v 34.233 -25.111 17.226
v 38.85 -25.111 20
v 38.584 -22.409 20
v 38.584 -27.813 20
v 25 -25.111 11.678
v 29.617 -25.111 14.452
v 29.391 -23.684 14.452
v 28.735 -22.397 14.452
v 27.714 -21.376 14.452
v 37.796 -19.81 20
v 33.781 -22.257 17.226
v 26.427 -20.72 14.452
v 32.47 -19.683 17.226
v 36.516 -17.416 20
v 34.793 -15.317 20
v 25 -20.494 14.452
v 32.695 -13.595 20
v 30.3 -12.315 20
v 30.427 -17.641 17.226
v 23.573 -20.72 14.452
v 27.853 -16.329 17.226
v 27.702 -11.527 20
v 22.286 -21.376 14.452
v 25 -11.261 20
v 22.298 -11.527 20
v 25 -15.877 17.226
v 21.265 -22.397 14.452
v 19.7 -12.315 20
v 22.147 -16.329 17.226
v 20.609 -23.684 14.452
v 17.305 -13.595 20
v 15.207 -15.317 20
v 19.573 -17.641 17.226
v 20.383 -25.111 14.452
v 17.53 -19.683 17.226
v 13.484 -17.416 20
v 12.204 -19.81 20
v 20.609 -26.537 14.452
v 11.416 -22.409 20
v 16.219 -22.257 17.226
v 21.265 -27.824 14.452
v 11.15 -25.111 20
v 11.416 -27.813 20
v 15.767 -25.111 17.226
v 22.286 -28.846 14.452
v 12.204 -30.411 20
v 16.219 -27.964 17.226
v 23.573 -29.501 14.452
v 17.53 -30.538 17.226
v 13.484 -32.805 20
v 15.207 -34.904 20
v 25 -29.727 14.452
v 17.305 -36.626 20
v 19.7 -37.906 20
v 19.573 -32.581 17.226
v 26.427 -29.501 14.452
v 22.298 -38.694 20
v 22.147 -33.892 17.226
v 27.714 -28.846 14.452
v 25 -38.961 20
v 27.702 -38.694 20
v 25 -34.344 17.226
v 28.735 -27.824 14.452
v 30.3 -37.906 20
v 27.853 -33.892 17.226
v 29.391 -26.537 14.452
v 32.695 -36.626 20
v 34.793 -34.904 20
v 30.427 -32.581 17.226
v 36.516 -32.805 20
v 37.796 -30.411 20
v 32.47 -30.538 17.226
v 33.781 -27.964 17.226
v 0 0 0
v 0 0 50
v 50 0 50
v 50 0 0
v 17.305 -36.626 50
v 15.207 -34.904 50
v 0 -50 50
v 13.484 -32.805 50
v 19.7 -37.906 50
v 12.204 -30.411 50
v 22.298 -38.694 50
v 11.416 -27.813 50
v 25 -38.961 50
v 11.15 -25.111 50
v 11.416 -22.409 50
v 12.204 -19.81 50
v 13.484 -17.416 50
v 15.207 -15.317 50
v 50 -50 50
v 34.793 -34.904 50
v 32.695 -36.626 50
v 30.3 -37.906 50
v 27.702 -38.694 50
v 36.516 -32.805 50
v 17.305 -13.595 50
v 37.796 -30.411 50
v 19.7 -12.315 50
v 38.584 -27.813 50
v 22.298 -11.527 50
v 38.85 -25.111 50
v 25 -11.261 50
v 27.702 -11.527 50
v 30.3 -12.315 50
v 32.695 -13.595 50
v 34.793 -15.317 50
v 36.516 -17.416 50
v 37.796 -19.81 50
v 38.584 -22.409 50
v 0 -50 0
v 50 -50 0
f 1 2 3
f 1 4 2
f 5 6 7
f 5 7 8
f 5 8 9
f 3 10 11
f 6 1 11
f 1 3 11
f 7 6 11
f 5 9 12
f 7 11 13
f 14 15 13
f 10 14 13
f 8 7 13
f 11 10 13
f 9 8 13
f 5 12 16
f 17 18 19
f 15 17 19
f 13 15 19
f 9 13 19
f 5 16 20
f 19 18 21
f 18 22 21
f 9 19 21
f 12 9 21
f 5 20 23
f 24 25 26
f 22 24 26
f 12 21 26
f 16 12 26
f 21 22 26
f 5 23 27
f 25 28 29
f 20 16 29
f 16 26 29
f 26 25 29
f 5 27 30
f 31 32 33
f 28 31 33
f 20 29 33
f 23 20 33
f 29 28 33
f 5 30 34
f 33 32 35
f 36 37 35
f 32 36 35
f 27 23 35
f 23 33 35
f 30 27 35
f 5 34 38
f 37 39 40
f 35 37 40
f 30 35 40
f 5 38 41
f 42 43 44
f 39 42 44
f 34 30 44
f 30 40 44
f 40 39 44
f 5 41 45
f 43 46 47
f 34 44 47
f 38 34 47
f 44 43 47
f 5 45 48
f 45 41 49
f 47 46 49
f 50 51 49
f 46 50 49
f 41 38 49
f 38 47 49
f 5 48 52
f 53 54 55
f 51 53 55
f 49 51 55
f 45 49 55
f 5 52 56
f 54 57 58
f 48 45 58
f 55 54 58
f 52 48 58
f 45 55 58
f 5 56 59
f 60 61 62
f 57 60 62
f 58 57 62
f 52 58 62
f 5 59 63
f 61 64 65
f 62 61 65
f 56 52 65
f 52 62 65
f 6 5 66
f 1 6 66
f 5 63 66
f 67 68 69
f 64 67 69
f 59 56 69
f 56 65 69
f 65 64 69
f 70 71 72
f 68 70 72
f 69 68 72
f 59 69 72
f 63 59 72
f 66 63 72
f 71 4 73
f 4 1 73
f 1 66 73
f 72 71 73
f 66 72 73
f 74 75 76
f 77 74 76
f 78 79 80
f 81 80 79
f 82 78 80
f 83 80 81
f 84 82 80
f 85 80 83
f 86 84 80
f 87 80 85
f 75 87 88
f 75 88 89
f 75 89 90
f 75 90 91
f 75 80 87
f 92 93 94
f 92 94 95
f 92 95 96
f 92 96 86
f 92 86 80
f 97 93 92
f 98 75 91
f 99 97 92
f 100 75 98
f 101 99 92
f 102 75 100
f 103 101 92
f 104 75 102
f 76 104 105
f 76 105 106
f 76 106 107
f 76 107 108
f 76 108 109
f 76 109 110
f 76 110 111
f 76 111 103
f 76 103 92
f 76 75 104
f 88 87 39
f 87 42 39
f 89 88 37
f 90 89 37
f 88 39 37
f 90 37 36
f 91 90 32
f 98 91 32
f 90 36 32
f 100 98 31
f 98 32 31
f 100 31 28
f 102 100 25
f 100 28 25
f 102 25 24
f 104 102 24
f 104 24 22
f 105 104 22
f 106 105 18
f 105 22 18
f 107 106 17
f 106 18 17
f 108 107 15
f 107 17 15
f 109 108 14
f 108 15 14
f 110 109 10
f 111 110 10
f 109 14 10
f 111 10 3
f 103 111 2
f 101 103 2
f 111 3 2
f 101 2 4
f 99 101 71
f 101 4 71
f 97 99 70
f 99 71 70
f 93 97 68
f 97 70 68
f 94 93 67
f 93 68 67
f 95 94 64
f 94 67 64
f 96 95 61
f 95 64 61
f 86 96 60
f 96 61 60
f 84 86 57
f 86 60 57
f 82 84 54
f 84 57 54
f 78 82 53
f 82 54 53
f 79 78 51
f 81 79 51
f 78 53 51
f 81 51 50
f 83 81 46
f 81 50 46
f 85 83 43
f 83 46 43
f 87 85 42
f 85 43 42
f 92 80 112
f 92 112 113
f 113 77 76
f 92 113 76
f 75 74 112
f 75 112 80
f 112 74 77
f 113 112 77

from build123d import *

# Parameters (mm, degrees)
F1_W     = 50
F1_H     = 50
F2_DEPTH = 50
F4_D     = 27.7
F4_DEPTH = 30
F4_TIP   = 8.3219195735


with BuildPart() as f2:
    # F1 (on face) → F2 (new body)
    with BuildSketch(Plane.XZ):
        with Locations((25, 25)):
            Rectangle(F1_W, F1_H)
    extrude(amount=F2_DEPTH)

    # F4
    with Locations(Plane.XY.offset(50)):
        with Locations((25, -25.1106228679)):
            Hole(F4_D / 2, depth=F4_DEPTH)
            with Locations((0, 0, -(F4_DEPTH + F4_TIP / 2))):  # 118° drill point
                Cone(0, F4_D / 2, F4_TIP, mode=Mode.SUBTRACT)


solid = f2.part
